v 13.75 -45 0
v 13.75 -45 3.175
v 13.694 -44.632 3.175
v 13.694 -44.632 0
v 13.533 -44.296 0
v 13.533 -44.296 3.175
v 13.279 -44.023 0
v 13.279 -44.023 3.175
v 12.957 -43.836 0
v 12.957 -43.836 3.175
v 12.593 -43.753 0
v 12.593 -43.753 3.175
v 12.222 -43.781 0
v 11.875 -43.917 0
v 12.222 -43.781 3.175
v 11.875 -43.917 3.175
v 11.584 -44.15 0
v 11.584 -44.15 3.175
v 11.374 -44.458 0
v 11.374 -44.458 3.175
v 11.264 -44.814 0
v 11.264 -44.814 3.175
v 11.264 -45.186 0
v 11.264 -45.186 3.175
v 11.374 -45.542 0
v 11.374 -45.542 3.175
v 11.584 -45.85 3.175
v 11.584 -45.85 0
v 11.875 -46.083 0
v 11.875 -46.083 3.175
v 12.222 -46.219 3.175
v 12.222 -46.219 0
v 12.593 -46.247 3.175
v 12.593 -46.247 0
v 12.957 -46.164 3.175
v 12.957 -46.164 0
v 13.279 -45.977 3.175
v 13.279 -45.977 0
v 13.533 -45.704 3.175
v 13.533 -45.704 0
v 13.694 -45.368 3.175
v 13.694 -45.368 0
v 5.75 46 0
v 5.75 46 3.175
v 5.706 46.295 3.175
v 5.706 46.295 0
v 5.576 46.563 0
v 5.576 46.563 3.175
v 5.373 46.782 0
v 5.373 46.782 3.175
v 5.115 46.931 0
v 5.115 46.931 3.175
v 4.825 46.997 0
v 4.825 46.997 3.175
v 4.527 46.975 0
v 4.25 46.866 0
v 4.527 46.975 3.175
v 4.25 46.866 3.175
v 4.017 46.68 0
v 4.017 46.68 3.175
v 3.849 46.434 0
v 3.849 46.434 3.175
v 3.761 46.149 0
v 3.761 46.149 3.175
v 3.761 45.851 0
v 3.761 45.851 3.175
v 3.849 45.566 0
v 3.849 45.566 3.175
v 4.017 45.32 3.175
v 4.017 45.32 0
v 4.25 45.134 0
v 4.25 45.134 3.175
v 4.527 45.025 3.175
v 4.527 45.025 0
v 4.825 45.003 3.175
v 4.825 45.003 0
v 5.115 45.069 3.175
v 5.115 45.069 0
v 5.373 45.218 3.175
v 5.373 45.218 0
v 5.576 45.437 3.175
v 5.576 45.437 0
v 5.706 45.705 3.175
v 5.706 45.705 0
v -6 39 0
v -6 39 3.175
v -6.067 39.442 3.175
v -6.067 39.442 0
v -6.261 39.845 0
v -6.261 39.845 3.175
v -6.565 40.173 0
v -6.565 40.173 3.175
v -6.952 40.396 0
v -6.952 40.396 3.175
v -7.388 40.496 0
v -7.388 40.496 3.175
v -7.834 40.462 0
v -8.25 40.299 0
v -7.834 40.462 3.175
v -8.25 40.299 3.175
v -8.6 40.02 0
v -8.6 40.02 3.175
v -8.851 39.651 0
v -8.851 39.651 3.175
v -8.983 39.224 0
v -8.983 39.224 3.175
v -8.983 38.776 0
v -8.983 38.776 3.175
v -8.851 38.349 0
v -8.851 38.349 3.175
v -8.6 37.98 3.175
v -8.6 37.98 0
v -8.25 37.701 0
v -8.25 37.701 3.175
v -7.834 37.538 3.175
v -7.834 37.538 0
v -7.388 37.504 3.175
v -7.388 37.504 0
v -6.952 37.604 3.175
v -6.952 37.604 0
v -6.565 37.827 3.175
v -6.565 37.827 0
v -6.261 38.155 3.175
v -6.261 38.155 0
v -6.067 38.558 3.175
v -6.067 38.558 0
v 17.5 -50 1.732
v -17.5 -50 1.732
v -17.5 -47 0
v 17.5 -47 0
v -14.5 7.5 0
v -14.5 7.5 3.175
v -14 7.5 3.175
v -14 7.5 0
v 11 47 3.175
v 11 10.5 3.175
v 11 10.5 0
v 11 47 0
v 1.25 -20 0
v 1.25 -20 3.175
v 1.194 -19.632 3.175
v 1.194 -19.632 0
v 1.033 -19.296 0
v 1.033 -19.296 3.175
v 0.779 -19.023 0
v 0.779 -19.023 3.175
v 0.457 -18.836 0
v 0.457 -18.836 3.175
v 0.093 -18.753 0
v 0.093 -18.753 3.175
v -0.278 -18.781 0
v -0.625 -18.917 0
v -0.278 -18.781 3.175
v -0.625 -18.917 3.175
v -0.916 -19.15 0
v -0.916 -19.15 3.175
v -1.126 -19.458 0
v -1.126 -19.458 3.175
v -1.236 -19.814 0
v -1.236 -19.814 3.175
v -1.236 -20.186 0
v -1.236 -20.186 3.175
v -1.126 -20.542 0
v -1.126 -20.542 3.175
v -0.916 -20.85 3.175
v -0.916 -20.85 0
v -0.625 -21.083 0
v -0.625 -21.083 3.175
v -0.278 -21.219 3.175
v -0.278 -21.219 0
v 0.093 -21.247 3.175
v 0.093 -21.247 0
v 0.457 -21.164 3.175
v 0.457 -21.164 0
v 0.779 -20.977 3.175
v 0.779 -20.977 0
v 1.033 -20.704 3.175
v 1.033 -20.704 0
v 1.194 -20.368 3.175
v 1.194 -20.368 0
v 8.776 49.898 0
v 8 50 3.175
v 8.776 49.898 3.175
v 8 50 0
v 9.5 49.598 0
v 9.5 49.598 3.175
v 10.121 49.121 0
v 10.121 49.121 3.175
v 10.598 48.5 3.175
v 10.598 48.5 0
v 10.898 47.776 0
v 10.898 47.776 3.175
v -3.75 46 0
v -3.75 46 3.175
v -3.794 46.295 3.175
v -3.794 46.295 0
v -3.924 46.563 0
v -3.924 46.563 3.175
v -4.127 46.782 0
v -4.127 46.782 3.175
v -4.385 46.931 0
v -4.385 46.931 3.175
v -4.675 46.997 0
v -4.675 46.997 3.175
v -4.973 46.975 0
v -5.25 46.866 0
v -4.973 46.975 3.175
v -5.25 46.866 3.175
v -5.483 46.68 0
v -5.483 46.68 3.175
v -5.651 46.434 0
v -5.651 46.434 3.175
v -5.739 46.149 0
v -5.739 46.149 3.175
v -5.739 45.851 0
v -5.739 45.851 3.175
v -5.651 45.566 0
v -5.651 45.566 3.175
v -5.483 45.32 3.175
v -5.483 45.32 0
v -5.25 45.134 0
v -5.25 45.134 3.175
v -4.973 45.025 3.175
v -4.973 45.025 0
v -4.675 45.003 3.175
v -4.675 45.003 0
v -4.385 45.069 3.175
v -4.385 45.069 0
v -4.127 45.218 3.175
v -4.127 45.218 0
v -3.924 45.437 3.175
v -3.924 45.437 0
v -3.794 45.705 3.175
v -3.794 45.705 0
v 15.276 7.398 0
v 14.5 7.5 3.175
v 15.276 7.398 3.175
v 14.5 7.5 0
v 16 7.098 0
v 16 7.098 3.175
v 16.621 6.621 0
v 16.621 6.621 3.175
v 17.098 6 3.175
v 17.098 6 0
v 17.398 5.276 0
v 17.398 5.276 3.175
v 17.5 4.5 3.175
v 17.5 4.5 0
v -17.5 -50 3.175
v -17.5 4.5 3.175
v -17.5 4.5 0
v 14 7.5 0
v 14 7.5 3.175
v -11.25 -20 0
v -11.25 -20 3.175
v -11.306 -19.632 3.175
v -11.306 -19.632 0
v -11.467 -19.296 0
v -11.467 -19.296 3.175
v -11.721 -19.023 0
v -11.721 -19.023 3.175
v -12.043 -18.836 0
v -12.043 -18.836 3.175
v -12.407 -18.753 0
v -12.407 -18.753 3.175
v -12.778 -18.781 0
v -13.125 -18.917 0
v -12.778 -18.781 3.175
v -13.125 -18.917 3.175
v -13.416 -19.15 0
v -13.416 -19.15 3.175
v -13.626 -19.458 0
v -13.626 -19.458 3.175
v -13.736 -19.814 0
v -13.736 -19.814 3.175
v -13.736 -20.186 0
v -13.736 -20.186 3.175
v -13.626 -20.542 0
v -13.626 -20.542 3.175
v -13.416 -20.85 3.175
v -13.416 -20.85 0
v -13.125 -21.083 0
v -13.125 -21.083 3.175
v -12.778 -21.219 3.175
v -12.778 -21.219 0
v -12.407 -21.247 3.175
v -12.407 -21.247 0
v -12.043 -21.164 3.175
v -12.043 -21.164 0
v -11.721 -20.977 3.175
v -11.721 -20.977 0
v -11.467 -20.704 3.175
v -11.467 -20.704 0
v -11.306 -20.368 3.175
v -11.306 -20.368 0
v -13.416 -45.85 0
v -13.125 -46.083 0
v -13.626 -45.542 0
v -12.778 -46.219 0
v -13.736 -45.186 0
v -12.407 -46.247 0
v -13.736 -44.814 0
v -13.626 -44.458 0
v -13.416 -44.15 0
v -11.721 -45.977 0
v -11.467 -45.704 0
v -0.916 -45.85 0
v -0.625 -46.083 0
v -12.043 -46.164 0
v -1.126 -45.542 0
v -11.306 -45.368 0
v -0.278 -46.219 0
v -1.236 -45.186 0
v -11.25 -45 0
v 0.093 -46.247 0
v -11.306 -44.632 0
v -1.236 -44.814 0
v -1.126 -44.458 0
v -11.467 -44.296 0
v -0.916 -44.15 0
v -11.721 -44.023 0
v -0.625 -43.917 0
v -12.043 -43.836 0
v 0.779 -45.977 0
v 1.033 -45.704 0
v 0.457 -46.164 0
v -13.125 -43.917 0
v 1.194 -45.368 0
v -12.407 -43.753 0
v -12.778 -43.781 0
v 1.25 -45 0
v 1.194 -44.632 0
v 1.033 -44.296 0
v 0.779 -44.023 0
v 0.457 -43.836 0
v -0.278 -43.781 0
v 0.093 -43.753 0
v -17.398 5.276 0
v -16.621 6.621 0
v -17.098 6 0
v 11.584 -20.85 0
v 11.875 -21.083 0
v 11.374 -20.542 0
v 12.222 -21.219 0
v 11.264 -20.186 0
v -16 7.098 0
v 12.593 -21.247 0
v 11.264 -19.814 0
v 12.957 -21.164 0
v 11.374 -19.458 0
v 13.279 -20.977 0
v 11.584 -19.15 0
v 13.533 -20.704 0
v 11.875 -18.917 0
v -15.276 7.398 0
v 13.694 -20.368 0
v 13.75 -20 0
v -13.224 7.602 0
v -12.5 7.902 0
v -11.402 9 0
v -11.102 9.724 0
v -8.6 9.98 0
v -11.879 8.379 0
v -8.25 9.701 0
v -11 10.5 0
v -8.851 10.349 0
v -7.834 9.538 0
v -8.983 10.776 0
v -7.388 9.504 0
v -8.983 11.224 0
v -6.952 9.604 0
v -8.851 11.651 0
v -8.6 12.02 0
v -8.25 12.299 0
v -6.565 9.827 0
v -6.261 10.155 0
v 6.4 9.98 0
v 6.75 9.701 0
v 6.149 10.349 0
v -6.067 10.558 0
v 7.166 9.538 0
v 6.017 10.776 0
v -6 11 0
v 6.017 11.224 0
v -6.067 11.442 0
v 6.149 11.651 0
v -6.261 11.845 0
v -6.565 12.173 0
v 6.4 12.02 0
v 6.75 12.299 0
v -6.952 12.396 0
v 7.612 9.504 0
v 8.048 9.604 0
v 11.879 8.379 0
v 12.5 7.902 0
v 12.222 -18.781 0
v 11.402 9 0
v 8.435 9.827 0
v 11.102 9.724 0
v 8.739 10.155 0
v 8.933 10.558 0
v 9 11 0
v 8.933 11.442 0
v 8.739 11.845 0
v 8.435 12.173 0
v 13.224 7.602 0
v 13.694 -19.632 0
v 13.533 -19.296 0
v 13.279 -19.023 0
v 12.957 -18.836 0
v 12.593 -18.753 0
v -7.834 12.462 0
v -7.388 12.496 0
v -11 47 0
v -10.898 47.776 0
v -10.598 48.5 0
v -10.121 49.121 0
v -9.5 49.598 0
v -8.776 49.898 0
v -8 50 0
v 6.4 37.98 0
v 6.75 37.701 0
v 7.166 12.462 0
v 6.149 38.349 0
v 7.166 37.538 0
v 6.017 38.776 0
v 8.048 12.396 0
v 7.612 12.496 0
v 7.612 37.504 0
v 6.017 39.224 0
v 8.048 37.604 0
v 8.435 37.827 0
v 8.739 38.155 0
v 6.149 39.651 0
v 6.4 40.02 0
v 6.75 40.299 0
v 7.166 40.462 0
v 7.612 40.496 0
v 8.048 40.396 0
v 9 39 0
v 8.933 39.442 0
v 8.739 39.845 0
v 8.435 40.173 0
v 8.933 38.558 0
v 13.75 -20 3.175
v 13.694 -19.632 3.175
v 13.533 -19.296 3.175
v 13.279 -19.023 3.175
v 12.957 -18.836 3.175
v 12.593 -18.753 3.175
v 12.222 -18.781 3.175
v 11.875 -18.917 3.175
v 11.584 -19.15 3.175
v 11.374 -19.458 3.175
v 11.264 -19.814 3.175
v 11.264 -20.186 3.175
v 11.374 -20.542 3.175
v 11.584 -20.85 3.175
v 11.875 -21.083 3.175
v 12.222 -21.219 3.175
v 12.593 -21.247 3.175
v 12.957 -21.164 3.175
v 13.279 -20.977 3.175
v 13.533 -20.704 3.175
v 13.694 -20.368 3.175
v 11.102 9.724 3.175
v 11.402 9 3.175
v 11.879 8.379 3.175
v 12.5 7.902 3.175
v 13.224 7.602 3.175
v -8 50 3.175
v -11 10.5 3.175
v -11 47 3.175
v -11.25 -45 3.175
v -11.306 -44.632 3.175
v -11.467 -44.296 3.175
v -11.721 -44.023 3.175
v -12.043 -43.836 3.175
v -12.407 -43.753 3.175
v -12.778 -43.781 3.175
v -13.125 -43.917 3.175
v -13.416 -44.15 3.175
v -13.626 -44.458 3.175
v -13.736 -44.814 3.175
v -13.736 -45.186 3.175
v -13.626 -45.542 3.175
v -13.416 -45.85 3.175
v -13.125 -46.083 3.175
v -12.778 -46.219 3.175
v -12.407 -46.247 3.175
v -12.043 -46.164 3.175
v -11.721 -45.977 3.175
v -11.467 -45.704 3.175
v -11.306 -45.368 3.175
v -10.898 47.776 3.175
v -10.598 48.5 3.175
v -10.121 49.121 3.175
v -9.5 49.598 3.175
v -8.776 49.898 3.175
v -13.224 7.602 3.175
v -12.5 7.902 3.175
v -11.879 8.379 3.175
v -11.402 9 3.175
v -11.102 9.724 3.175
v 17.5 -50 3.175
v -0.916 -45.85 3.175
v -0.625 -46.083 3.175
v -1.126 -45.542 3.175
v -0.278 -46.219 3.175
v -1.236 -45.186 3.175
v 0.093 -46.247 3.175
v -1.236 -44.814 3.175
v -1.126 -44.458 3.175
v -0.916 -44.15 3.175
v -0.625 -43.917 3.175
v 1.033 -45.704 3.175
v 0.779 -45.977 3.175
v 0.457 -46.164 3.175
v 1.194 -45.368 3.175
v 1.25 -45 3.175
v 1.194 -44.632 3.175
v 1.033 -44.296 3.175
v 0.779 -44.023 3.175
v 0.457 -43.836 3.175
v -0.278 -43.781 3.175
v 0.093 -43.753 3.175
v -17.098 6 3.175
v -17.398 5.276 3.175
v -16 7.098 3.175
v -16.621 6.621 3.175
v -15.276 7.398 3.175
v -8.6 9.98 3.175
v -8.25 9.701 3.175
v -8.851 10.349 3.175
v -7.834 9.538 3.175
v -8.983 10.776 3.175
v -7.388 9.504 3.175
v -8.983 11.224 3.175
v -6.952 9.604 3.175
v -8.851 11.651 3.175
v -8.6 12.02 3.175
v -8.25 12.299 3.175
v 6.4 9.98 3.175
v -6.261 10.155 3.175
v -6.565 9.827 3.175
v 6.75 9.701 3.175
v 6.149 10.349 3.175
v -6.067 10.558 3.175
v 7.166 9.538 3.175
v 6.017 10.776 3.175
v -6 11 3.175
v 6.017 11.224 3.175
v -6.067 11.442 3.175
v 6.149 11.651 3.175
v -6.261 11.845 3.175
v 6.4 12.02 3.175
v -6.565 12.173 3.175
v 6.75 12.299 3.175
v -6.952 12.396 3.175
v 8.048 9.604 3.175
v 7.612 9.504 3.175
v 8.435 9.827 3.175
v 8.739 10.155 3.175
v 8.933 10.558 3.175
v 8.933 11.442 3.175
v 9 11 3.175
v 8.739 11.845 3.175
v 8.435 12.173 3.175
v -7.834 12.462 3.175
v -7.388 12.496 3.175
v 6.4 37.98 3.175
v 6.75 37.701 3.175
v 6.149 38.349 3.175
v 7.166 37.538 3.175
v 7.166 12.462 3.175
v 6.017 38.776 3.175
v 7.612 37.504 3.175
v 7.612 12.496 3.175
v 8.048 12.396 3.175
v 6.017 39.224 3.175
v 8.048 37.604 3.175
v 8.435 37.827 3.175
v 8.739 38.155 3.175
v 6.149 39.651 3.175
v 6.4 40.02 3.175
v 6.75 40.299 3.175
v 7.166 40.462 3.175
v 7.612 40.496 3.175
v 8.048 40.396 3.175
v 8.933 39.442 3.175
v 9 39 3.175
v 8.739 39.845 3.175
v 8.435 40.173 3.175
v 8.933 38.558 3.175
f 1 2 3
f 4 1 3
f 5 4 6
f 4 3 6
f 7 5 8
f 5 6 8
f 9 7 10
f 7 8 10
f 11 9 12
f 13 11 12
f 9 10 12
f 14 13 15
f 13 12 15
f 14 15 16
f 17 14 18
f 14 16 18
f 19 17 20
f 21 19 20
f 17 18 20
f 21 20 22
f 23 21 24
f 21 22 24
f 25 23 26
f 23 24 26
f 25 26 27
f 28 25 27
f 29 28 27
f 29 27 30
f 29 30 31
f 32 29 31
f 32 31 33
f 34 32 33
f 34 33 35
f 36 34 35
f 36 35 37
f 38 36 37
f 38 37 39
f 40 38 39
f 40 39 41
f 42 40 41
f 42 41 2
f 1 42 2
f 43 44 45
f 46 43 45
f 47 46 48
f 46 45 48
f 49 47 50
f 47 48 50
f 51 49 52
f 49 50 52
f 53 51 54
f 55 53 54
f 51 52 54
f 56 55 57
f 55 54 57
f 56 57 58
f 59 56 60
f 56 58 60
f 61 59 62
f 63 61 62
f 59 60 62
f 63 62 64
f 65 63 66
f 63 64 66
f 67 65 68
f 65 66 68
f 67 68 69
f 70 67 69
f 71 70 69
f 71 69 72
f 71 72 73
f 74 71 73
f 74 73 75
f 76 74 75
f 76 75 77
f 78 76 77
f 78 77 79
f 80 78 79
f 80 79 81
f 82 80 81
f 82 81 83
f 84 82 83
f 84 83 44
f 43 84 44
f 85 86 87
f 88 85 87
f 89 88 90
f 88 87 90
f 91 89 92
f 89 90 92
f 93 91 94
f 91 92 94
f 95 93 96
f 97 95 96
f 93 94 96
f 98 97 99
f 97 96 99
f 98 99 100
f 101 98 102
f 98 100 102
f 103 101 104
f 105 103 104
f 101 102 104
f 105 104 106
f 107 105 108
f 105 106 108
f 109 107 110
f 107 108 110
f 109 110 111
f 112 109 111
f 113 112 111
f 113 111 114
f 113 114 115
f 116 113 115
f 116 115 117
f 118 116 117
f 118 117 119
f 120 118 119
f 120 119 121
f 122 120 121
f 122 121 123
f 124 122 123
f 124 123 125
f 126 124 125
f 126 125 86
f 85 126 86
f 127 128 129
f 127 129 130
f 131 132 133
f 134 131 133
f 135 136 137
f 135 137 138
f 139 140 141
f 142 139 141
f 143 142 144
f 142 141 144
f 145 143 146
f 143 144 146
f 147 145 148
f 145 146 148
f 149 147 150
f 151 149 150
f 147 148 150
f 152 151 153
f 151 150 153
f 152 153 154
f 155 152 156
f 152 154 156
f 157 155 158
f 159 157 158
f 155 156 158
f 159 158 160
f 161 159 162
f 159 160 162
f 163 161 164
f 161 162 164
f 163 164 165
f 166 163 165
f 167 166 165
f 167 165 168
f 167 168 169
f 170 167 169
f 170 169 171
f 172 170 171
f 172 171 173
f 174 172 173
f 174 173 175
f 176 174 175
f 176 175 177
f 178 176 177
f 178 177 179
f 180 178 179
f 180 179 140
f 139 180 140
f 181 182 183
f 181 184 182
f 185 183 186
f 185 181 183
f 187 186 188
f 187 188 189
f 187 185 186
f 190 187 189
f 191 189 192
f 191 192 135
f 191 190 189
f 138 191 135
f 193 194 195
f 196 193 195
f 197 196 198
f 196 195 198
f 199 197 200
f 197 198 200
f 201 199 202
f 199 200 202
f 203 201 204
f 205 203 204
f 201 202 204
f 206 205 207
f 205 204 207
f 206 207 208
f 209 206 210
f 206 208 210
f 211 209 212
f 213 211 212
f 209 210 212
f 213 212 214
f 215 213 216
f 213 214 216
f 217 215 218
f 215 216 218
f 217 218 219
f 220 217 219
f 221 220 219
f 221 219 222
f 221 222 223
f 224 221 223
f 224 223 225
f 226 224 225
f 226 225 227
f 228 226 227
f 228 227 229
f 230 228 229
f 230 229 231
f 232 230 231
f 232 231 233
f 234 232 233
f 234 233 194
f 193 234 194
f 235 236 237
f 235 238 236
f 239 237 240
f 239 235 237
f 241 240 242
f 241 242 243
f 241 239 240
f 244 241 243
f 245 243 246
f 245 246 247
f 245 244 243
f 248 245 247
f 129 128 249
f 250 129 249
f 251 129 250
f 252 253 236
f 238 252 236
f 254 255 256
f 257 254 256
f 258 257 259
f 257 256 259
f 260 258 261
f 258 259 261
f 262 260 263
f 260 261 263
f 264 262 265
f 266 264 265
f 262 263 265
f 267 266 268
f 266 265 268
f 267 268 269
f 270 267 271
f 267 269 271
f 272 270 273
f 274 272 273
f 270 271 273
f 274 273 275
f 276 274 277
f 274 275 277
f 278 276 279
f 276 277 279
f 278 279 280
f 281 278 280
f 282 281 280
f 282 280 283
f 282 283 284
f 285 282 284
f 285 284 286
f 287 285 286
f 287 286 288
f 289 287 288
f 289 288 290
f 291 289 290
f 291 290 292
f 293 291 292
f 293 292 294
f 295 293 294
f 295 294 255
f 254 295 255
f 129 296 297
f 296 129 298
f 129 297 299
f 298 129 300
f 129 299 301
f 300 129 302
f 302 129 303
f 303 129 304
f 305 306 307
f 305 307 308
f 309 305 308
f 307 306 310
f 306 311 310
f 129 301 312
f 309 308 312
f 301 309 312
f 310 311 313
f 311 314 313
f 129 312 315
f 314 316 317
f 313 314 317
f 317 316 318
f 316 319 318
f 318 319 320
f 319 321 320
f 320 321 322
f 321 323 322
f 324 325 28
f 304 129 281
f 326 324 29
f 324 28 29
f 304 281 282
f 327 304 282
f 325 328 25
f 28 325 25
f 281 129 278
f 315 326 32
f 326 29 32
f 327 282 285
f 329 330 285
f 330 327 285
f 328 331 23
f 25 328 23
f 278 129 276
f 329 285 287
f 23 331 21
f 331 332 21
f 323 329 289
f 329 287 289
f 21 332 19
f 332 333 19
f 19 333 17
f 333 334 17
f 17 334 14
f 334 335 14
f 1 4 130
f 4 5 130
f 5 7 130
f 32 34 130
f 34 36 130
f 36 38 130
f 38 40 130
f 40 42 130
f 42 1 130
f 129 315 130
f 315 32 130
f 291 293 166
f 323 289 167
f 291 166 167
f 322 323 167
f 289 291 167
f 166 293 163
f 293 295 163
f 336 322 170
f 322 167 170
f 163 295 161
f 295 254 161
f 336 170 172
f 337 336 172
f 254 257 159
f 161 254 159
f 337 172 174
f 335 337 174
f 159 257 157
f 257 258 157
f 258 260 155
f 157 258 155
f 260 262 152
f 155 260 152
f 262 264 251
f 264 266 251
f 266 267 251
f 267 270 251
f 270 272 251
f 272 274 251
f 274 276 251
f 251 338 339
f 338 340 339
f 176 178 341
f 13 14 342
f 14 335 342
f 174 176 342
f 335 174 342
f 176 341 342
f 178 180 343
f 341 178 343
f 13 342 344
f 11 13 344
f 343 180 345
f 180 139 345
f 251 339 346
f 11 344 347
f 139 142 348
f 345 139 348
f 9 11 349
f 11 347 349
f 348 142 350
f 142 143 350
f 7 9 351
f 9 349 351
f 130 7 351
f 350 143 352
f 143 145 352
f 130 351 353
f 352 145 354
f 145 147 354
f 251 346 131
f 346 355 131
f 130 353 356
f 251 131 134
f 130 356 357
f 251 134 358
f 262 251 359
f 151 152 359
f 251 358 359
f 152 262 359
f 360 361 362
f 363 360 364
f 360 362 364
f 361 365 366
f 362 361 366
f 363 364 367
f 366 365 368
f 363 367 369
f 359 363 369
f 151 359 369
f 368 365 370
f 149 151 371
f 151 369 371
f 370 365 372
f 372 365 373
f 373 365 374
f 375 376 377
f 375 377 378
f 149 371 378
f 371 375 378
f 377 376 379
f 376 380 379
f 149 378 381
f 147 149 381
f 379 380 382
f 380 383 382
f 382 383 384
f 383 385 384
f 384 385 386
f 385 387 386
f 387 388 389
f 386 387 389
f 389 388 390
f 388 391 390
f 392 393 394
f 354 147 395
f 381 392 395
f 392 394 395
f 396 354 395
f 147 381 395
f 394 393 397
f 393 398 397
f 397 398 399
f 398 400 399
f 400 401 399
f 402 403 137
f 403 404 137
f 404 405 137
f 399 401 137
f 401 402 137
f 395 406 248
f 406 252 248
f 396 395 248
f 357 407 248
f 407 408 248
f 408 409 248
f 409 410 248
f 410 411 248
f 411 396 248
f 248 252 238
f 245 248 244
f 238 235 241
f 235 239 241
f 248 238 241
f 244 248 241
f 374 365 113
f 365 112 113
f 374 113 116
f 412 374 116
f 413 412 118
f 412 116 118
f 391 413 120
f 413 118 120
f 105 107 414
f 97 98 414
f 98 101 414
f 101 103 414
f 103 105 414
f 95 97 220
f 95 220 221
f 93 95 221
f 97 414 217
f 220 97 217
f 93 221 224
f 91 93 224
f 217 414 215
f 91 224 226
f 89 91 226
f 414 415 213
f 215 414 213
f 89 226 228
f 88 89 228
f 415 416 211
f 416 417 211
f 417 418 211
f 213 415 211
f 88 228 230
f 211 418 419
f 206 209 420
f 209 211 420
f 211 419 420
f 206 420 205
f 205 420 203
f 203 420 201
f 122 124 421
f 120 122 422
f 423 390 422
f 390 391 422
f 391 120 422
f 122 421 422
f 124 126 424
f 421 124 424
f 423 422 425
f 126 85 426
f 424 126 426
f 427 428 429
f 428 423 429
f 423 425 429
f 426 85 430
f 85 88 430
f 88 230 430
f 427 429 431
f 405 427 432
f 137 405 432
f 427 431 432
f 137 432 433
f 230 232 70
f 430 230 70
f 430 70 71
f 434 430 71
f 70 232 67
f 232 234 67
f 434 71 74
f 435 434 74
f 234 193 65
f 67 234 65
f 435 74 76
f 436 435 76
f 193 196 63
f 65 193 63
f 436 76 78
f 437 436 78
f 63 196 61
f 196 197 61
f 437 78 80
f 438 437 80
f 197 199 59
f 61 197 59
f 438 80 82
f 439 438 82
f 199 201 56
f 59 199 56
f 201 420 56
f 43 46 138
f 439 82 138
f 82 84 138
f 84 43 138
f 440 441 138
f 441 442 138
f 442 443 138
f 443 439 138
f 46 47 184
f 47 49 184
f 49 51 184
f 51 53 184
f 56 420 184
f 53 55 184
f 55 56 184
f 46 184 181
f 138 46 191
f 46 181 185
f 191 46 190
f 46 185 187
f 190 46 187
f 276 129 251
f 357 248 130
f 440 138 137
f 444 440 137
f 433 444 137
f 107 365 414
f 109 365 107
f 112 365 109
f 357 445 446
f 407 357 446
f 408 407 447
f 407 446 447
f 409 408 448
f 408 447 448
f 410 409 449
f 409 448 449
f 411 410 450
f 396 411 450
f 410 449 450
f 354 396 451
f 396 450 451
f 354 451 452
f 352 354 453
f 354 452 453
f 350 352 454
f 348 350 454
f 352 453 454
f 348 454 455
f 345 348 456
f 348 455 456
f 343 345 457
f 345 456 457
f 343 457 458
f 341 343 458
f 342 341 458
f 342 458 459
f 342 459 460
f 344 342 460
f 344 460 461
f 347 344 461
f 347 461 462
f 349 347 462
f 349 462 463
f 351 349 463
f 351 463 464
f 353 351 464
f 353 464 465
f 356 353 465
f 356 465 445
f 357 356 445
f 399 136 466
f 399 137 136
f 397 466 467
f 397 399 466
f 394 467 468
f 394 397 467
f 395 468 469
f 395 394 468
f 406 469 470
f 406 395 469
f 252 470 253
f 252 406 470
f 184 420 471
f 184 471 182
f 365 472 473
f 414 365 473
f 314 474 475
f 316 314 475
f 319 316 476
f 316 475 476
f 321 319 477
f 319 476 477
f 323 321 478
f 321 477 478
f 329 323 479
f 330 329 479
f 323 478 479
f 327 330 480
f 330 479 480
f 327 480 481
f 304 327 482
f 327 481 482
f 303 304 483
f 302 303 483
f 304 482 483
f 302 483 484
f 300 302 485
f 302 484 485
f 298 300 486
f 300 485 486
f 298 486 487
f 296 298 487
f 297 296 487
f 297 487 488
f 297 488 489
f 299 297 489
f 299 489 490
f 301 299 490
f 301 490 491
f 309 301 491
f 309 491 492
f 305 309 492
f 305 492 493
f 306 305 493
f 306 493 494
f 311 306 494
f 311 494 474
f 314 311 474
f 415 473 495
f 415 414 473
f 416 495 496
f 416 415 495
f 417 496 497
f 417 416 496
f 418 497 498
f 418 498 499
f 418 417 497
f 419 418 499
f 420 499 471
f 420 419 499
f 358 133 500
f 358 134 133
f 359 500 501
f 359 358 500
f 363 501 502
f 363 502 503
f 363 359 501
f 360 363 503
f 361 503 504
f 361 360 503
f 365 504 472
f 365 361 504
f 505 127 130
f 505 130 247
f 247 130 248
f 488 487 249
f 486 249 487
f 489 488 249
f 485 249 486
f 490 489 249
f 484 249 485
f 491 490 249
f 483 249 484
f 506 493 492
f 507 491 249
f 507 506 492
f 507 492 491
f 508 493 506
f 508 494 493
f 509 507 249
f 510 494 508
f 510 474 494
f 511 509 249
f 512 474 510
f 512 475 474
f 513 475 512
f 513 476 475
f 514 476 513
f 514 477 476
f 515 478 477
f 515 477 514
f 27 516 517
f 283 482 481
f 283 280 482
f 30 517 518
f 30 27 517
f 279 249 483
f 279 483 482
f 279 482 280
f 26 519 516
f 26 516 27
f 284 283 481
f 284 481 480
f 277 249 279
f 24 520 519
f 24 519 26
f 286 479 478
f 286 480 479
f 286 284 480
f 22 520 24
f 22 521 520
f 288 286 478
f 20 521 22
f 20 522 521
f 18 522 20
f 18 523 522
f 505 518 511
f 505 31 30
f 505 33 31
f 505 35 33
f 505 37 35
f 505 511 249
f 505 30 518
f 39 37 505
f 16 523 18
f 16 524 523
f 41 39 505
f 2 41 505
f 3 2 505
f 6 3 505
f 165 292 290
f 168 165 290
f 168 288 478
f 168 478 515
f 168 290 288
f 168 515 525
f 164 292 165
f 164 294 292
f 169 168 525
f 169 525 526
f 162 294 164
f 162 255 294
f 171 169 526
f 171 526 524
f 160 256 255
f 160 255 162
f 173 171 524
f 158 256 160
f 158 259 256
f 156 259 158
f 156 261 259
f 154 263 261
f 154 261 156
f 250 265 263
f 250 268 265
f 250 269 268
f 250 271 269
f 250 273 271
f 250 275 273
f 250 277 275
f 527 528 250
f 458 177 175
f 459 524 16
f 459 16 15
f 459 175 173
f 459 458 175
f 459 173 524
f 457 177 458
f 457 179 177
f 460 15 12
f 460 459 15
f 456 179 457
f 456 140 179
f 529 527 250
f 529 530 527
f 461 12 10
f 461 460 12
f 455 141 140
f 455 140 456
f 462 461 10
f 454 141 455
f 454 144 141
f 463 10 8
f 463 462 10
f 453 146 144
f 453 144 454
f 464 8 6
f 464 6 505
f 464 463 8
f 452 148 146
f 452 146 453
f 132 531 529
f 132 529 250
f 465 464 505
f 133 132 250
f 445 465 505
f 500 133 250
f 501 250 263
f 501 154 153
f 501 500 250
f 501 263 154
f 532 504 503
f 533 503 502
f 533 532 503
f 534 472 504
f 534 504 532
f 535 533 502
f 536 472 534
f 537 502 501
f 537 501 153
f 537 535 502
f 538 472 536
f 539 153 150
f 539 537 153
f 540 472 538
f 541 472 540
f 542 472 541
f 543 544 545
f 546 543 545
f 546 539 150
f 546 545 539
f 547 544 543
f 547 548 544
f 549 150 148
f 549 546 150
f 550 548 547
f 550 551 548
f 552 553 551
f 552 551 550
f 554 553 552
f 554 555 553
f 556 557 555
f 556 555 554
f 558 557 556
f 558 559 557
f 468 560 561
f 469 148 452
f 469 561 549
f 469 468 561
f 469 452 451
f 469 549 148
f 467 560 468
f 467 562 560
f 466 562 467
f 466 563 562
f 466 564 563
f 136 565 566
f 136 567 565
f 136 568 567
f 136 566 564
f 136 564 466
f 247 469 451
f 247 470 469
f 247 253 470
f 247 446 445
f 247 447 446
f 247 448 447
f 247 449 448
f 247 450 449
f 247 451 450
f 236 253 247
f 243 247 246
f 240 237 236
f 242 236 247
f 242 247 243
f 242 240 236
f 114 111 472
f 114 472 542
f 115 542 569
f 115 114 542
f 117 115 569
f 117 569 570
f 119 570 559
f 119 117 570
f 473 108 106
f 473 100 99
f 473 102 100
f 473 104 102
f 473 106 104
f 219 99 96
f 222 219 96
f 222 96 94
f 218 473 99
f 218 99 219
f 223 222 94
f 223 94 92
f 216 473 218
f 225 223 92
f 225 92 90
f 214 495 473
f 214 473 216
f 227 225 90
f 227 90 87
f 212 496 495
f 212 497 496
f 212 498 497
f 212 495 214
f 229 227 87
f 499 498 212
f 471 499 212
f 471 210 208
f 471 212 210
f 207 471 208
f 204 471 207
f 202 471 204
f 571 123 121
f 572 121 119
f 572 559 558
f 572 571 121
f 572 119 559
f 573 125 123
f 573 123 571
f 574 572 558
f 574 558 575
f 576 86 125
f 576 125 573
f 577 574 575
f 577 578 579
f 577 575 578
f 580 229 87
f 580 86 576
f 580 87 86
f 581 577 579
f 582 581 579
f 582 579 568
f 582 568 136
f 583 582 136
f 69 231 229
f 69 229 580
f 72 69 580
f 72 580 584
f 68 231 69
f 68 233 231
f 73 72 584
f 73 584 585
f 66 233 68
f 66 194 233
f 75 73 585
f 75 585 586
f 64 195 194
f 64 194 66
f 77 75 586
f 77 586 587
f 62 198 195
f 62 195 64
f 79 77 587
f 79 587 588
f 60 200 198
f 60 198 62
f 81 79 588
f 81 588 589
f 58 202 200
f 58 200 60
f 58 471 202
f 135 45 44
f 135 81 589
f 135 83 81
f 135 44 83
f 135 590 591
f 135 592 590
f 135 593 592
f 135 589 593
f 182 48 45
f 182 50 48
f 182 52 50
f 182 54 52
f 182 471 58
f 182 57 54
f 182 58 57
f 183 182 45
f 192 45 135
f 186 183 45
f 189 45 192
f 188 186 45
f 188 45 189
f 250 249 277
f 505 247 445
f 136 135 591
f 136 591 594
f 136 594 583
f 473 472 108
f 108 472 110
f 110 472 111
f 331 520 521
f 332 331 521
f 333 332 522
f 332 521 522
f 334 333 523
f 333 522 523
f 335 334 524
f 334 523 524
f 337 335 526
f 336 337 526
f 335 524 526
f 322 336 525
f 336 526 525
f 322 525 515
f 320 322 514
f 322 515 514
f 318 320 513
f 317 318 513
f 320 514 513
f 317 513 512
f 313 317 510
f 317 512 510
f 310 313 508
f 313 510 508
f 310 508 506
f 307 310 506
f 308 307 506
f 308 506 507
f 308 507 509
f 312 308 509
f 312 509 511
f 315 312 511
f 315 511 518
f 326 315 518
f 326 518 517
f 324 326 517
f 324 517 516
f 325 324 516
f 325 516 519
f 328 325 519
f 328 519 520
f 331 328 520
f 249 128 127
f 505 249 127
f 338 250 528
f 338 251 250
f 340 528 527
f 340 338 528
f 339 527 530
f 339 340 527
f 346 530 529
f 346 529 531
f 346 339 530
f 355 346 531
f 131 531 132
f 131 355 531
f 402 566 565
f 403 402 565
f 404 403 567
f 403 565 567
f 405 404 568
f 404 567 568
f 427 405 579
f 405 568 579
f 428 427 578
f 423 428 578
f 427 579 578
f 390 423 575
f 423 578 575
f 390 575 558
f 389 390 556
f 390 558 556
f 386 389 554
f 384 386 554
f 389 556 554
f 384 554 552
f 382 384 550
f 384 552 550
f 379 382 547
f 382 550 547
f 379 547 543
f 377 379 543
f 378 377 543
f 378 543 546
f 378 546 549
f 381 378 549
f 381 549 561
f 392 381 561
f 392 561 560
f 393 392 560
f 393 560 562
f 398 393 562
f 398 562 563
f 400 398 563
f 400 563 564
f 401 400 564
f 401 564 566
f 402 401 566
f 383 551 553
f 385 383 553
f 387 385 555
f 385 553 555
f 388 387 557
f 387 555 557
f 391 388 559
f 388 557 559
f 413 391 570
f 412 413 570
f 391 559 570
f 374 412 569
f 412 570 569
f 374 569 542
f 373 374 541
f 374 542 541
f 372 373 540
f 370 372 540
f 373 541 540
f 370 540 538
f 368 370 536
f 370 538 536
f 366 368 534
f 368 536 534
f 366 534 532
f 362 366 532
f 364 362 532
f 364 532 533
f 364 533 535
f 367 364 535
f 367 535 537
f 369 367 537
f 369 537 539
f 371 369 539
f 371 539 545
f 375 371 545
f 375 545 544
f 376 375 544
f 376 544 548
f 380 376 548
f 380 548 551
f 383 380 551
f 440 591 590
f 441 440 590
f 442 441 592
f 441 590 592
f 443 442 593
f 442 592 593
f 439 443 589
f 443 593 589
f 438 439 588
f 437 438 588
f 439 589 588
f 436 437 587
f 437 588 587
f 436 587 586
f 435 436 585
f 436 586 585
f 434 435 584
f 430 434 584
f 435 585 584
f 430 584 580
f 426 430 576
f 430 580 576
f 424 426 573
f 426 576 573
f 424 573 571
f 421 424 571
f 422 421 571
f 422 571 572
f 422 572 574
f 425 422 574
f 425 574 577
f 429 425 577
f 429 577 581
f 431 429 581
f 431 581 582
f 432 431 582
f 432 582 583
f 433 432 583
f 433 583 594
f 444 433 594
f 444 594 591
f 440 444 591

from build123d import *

# Parameters (mm, degrees)
SKETCH1_W           = 35
SKETCH1_H           = 100
BOSS_EXTRUDE1_DEPTH = 3.175
SKETCH2_R           = 1.5
SKETCH2_W           = 6.5
SKETCH2_H           = 42.5
CUT_EXTRUDE1_DEPTH  = 4.175
FILLET1_R           = 3
CHAMFER1_SIZE       = 3
CHAMFER1_SIZE2      = 1.732050808
SKETCH3_R           = 1
CUT_EXTRUDE2_DEPTH  = 4.175
SKETCH4_R           = 1.25
CUT_EXTRUDE3_DEPTH  = 4.175


with BuildPart() as part:
    # Sketch1 → Boss-Extrude1 (new body)
    with BuildSketch(Plane.XY):
        Rectangle(SKETCH1_W, SKETCH1_H)
    extrude(amount=BOSS_EXTRUDE1_DEPTH)

    # Sketch2 → Cut-Extrude1 (cut, through all)
    with BuildSketch(Plane.XY.offset(3.175)):
        with Locations((-7.5, 39)):
            Circle(SKETCH2_R)
        with Locations((-7.5, 11)):
            Circle(SKETCH2_R)
        with Locations((7.5, 11)):
            Circle(SKETCH2_R)
        with Locations((7.5, 39)):
            Circle(SKETCH2_R)
        with Locations((-14.25, 28.75)):
            Rectangle(SKETCH2_W, SKETCH2_H)
        with Locations((14.25, 28.75)):
            Rectangle(SKETCH2_W, SKETCH2_H)
    extrude(amount=-CUT_EXTRUDE1_DEPTH, mode=Mode.SUBTRACT)

    # Fillet1
    fillet1_edges = [part.edges().sort_by_distance(p)[0] for p in [
        (-17.5, 7.5, 1.5875),
        (-11, 50, 1.5875),
        (-11, 7.5, 1.5875),
        (11, 7.5, 1.5875),
        (11, 50, 1.5875),
        (17.5, 7.5, 1.5875),
    ]]
    fillet(fillet1_edges, radius=FILLET1_R)

    # Chamfer1
    chamfer1_edges = [part.edges().sort_by_distance(p)[0] for p in [
        (0, -50, 0),
    ]]
    chamfer1_side = [part.faces().sort_by_distance(p)[0] for p in [
        (0, -5.754552851, 0),
    ]]
    chamfer(chamfer1_edges, length=CHAMFER1_SIZE, length2=CHAMFER1_SIZE2, reference=chamfer1_side[0])

    # Sketch3 → Cut-Extrude2 (cut, through all)
    with BuildSketch(Plane.XY.offset(3.175)):
        with Locations((-4.75, 46)):
            Circle(SKETCH3_R)
        with Locations((4.75, 46)):
            Circle(SKETCH3_R)
    extrude(amount=-CUT_EXTRUDE2_DEPTH, mode=Mode.SUBTRACT)

    # Sketch4 → Cut-Extrude3 (cut, through all)
    with BuildSketch(Plane.XY.offset(3.175)):
        with Locations((-12.5, -45)):
            Circle(SKETCH4_R)
        with Locations((12.5, -45)):
            Circle(SKETCH4_R)
        with Locations((-12.5, -20)):
            Circle(SKETCH4_R)
        with Locations((12.5, -20)):
            Circle(SKETCH4_R)
        with Locations((0, -45)):
            Circle(SKETCH4_R)
        with Locations((0, -20)):
            Circle(SKETCH4_R)
    extrude(amount=-CUT_EXTRUDE3_DEPTH, mode=Mode.SUBTRACT)


solid = part.part
